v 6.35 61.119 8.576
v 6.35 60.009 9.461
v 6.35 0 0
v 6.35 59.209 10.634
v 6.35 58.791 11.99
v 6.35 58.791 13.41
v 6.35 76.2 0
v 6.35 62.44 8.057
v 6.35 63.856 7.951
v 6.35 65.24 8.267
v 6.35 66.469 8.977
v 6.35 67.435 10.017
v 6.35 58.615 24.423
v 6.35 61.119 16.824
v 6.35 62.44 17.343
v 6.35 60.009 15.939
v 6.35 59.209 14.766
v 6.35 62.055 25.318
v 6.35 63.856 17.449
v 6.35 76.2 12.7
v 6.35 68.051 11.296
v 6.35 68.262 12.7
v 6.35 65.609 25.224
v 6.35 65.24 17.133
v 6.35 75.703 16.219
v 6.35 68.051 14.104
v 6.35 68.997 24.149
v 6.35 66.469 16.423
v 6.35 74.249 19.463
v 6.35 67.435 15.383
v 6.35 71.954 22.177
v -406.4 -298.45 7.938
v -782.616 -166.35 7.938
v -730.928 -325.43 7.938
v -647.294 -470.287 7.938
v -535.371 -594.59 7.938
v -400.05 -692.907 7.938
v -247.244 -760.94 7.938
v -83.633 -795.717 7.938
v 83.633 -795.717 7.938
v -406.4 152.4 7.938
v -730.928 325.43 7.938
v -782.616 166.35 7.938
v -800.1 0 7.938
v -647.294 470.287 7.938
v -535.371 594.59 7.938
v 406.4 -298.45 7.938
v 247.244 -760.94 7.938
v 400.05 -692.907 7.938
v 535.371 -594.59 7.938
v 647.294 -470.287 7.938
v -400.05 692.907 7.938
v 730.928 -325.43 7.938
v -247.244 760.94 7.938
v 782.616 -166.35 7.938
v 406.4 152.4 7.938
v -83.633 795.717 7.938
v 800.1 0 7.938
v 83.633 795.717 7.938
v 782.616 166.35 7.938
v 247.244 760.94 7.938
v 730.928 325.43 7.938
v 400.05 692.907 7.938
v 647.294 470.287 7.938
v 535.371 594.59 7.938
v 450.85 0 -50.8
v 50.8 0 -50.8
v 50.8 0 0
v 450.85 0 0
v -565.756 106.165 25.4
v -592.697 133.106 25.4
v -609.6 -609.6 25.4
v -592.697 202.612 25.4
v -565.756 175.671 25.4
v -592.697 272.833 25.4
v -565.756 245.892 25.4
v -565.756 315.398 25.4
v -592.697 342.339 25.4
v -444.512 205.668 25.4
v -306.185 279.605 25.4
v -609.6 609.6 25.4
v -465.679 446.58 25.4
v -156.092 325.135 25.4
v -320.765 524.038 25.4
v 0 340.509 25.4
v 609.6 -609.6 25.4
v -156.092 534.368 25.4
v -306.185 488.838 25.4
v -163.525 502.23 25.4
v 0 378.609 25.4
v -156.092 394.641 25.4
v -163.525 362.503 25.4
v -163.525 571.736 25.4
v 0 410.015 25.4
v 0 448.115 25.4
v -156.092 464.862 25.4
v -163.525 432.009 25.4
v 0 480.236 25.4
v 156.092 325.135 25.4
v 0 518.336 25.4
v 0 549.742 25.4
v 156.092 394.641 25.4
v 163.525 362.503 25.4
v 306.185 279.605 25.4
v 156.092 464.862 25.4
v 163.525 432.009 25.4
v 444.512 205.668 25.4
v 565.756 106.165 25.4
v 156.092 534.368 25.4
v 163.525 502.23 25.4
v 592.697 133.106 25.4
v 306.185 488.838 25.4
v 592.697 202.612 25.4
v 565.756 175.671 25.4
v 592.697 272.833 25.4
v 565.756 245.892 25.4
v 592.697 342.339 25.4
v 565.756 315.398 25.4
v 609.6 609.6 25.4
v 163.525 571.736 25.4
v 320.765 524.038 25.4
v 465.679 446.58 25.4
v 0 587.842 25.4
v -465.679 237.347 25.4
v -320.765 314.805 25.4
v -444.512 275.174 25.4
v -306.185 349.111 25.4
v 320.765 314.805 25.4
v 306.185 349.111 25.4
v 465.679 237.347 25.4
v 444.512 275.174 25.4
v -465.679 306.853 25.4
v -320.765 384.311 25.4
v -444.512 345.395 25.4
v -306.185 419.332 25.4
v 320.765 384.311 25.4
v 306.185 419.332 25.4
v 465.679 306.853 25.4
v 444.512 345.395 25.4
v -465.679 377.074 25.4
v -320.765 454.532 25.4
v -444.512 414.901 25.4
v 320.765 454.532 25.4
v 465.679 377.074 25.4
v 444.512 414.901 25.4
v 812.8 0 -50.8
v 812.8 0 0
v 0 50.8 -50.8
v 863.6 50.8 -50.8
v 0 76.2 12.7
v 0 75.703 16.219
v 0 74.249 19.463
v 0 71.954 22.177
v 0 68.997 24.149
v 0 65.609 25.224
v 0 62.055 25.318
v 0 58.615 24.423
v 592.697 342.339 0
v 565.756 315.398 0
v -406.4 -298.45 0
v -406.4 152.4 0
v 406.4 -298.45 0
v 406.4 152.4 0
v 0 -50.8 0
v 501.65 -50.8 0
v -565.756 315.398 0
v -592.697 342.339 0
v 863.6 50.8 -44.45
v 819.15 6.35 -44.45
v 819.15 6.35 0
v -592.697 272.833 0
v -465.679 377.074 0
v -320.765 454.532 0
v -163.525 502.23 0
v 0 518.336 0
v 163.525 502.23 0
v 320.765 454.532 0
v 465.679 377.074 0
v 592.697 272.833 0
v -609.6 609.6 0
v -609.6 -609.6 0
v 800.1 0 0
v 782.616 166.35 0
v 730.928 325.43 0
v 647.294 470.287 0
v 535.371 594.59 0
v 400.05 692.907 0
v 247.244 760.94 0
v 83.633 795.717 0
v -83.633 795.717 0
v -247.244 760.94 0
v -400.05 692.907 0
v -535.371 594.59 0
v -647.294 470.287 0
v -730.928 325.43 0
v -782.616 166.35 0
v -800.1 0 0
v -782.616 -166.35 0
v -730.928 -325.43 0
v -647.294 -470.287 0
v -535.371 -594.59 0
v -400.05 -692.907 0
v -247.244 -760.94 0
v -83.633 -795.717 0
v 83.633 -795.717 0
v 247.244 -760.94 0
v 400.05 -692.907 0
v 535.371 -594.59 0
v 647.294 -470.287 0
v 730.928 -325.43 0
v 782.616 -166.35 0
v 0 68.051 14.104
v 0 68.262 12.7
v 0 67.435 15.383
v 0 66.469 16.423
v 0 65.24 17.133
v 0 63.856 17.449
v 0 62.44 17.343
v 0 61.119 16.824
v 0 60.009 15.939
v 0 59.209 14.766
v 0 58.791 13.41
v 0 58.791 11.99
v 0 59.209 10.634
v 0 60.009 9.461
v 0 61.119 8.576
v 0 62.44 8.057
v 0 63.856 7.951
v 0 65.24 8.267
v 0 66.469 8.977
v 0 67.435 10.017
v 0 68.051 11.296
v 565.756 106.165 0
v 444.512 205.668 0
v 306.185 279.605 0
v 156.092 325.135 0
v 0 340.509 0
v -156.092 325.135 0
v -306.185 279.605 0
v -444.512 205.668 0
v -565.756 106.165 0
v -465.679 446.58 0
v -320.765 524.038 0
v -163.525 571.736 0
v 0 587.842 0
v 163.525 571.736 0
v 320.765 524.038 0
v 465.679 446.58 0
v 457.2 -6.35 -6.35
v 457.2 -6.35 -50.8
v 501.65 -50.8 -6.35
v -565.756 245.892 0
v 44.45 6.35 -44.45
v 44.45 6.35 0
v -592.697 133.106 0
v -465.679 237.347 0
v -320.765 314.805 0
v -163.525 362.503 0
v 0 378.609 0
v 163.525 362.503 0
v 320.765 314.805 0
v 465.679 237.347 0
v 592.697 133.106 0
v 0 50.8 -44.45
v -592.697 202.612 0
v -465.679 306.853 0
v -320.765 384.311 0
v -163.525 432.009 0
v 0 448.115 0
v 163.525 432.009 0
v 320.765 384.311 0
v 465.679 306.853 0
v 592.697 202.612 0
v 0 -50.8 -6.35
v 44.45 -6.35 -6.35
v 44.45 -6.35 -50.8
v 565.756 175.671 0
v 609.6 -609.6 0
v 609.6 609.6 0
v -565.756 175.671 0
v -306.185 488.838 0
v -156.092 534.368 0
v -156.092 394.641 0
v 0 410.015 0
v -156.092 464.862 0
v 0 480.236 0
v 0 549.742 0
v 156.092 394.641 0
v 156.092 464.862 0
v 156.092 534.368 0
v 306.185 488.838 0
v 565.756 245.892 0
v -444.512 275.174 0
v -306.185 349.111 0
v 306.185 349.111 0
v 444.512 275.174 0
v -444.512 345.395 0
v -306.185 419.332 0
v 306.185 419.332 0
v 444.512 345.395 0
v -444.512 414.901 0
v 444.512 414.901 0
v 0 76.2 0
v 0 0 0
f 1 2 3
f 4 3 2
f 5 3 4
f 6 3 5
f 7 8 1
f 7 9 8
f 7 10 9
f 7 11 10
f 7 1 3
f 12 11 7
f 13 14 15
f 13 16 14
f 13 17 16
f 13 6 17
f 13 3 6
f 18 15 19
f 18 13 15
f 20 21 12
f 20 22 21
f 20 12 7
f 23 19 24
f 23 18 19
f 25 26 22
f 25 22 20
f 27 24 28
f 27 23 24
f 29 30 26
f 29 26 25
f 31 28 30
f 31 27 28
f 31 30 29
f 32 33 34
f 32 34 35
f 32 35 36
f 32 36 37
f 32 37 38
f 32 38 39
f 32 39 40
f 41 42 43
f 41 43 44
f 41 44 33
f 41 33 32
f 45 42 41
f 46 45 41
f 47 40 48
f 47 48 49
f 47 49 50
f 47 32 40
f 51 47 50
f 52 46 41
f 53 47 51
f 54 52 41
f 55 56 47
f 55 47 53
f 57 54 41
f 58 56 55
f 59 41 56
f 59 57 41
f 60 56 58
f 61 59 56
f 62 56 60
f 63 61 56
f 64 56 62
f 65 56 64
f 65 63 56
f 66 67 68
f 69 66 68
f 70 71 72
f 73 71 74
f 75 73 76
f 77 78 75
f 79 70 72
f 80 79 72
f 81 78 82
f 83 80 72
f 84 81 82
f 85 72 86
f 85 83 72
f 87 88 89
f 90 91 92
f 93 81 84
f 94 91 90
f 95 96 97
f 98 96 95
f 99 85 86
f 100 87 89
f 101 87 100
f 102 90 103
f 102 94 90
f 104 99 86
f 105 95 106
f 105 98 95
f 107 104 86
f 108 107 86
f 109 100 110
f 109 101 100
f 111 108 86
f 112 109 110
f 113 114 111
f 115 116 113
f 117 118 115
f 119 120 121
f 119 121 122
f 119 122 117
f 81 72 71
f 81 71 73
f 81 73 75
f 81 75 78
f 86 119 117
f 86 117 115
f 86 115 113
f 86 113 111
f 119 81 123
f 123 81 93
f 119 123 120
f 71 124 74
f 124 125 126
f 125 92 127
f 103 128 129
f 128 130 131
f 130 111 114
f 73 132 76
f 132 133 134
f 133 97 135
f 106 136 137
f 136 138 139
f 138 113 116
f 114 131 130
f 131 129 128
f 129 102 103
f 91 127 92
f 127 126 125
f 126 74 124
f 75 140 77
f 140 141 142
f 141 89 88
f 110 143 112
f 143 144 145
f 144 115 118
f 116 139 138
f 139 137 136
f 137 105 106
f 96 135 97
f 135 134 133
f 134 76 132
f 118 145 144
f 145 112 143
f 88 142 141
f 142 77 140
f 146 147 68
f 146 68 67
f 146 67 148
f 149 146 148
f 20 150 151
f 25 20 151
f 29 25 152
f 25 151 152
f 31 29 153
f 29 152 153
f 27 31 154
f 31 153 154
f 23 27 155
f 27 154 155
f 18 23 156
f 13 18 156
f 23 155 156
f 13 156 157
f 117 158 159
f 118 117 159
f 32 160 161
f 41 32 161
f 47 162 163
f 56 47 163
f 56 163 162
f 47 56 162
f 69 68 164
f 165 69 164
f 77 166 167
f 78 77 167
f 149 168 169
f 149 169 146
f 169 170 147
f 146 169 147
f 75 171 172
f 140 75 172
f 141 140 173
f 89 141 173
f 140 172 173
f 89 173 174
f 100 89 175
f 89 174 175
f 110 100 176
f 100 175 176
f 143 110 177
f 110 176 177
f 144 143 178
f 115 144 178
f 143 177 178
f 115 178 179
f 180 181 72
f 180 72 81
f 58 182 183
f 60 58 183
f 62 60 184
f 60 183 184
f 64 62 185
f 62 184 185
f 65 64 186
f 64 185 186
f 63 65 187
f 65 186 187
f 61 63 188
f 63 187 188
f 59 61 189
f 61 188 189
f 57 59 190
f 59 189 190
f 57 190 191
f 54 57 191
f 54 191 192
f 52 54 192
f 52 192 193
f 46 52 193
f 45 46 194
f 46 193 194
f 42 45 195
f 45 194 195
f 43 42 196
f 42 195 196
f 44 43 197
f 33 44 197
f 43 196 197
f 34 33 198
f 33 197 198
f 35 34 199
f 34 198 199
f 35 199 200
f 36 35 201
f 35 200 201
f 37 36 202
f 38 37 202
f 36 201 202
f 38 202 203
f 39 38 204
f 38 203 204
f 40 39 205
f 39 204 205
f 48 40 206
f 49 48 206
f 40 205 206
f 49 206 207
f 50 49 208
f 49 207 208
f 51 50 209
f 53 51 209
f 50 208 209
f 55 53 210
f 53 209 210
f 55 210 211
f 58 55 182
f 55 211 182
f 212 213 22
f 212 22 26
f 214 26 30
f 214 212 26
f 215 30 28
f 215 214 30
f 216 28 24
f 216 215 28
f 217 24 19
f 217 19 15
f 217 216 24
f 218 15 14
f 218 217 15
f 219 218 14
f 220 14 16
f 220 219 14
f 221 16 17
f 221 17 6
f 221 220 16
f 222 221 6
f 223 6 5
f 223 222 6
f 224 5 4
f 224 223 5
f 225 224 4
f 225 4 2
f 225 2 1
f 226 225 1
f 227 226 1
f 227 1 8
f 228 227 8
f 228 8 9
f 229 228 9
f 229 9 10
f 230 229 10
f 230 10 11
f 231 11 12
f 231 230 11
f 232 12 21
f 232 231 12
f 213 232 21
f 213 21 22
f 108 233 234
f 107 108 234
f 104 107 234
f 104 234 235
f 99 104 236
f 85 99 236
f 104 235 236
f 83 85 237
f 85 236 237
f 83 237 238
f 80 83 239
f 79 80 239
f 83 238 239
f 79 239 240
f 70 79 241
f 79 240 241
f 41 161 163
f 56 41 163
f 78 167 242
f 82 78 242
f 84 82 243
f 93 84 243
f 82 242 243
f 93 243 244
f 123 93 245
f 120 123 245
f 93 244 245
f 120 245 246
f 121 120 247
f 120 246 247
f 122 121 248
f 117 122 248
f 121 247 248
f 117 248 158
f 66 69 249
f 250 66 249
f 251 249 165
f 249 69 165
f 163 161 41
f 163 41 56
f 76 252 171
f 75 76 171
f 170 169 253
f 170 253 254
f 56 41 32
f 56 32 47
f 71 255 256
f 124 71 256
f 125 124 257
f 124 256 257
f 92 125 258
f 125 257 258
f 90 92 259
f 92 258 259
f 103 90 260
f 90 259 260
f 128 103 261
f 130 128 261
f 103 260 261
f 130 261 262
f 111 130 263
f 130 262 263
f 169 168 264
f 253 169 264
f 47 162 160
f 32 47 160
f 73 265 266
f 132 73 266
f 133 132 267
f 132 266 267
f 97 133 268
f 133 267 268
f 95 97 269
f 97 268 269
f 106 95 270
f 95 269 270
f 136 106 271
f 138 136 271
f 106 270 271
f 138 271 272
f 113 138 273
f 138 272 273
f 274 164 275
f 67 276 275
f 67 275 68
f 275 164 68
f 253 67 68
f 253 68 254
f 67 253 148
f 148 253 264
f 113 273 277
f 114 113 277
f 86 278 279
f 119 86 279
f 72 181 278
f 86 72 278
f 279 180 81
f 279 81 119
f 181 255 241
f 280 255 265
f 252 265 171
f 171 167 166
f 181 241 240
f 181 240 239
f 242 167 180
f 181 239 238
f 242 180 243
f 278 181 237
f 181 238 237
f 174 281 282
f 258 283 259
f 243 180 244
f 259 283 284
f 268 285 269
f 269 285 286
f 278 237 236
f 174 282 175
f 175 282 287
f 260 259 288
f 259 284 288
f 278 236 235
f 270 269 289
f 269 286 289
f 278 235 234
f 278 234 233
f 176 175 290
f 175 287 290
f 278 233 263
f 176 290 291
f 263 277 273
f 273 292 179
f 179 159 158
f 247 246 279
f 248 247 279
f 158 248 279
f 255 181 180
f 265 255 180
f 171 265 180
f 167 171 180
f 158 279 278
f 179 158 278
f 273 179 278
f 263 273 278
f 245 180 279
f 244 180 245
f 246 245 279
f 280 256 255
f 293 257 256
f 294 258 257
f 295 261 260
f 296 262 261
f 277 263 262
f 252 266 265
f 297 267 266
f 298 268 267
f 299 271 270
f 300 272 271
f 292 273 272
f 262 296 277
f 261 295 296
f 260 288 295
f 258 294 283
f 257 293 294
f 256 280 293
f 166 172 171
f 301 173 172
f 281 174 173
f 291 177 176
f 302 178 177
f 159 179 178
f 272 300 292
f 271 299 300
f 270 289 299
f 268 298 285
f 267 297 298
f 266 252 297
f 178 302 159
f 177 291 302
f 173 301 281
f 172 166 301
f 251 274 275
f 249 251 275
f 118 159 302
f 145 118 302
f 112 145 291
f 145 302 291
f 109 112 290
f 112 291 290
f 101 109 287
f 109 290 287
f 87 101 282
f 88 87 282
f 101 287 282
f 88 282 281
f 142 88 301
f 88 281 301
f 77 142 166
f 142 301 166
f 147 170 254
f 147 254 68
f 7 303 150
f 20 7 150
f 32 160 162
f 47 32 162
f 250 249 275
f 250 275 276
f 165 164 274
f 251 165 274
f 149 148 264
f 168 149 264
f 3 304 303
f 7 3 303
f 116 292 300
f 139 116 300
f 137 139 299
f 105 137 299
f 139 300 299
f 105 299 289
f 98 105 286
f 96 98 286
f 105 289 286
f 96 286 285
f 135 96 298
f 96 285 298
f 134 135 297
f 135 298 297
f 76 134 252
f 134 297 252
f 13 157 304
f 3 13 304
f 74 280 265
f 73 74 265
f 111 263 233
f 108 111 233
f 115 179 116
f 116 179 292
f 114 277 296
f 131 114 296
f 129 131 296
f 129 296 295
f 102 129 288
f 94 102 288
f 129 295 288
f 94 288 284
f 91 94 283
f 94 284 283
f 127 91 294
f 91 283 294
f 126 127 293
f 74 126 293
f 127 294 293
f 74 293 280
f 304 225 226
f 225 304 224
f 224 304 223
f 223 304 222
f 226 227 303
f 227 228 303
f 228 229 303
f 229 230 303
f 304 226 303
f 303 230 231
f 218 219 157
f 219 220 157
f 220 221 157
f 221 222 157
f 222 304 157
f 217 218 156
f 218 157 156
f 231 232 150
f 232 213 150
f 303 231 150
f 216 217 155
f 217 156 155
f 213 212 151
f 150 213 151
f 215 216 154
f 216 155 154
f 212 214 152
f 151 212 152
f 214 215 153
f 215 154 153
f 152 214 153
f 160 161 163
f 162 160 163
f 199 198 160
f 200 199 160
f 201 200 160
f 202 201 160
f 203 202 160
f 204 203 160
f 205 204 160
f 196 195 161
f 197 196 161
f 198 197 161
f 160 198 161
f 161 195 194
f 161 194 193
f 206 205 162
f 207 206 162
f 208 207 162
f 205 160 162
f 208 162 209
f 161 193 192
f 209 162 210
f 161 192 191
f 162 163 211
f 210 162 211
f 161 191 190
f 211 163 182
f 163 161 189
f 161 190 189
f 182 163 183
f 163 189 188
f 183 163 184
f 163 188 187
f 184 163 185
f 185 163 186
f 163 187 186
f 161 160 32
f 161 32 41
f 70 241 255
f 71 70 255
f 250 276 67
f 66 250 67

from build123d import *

# Parameters (mm, degrees)
F0_R      = 800.1
F1_DEPTH  = 7.9375
F2_R      = 4.7625
F3_DEPTH  = 6.35
F4_W      = 812.8
F4_H      = 450.85
F5_DEPTH  = 7.9375
F7_DEPTH  = 863.6
F9_DEPTH  = 50.8
F11_DEPTH = 501.65
F13_DEPTH = 50.8
F14_W     = 1219.2
F14_H     = 1219.2
F15_DEPTH = 25.4


with BuildPart() as f1:
    # F0 (on Top) → F1 (new body)
    with BuildSketch(Plane.XY):
        Circle(F0_R)
        Polygon((-406.4, 152.4), (0, 152.4), (406.4, 152.4), (406.4, -298.45), (-406.4, -298.45), align=None, mode=Mode.SUBTRACT)
    extrude(amount=F1_DEPTH)


with BuildPart() as f3:
    # F2 (on Right) → F3 (new body)
    with BuildSketch(Plane.YZ):
        with BuildLine():
            Line((58.615385, 24.423077), (0, 0))
            Line((0, 0), (76.2, 0))
            Line((76.2, 0), (76.2, 12.7))
            ThreePointArc((76.2, 12.7), (70.544692, 23.267039), (58.615385, 24.423077))
        make_face()
        with Locations((63.5, 12.7)):
            Circle(F2_R, mode=Mode.SUBTRACT)
    extrude(amount=F3_DEPTH)


with BuildPart() as f5:
    # F4 (on Top) → F5 (new body)
    with BuildSketch(Plane.XY):
        with Locations((0, -73.025)):
            Rectangle(F4_W, F4_H)
    extrude(amount=F5_DEPTH)


with BuildPart() as f7:
    # F6 (on Right) → F7 (new body)
    with BuildSketch(Plane.YZ):
        Polygon((6.35, 0), (0, 0), (0, -50.8), (50.8, -50.8), (50.8, -44.45), (6.35, -44.45), align=None)
    extrude(amount=F7_DEPTH)

    # F8 (on Top) → F9 (cut)
    with BuildSketch(Plane.XY):
        Polygon((0, 50.8), (0, 0), (50.8, 0), align=None)
        Polygon((863.6, 0), (863.6, 50.8), (812.8, 0), align=None)
    extrude(amount=-F9_DEPTH, mode=Mode.SUBTRACT)


with BuildPart() as f11:
    # F10 (on Right) → F11 (new body)
    with BuildSketch(Plane.YZ):
        Polygon((0, -50.8), (0, 0), (-50.8, 0), (-50.8, -6.35), (-6.35, -6.35), (-6.35, -50.8), align=None)
    extrude(amount=F11_DEPTH)

    # F12 (on Top) → F13 (cut)
    with BuildSketch(Plane.XY):
        Polygon((501.65, -50.8), (501.65, 0), (450.85, 0), align=None)
        Polygon((0, 0), (0, -50.8), (50.8, 0), align=None)
    extrude(amount=-F13_DEPTH, mode=Mode.SUBTRACT)


with BuildPart() as f15:
    # F14 (on Top) → F15 (new body)
    with BuildSketch(Plane.XY):
        Rectangle(F14_W, F14_H)
        with BuildLine():
            ThreePointArc((-592.696911, 133.105716), (-7e-06, 378.608812), (592.696897, 133.105716))
            Line((592.696897, 133.105716), (565.756129, 106.164947))
            ThreePointArc((565.756129, 106.164947), (-7e-06, 340.508812), (-565.756142, 106.164947))
            Line((-565.756142, 106.164947), (-592.696911, 133.105716))
        make_face(mode=Mode.SUBTRACT)
        with BuildLine():
            ThreePointArc((-592.696904, 202.611684), (0, 448.11478), (592.696904, 202.611684))
            Line((592.696904, 202.611684), (565.756136, 175.670915))
            ThreePointArc((565.756136, 175.670915), (0, 410.01478), (-565.756136, 175.670915))
            Line((-565.756136, 175.670915), (-592.696904, 202.611684))
        make_face(mode=Mode.SUBTRACT)
        with BuildLine():
            ThreePointArc((-592.696911, 272.832891), (-7e-06, 518.335987), (592.696897, 272.832891))
            Line((592.696897, 272.832891), (565.756129, 245.892122))
            ThreePointArc((565.756129, 245.892122), (-7e-06, 480.235987), (-565.756142, 245.892122))
            Line((-565.756142, 245.892122), (-592.696911, 272.832891))
        make_face(mode=Mode.SUBTRACT)
        with BuildLine():
            ThreePointArc((-592.696904, 342.338859), (0, 587.841955), (592.696904, 342.338859))
            Line((592.696904, 342.338859), (565.756136, 315.398091))
            ThreePointArc((565.756136, 315.398091), (0, 549.741955), (-565.756136, 315.398091))
            Line((-565.756136, 315.398091), (-592.696904, 342.338859))
        make_face(mode=Mode.SUBTRACT)
    extrude(amount=F15_DEPTH)


solid = Compound([f1.part, f3.part, f5.part, f7.part, f11.part, f15.part])
